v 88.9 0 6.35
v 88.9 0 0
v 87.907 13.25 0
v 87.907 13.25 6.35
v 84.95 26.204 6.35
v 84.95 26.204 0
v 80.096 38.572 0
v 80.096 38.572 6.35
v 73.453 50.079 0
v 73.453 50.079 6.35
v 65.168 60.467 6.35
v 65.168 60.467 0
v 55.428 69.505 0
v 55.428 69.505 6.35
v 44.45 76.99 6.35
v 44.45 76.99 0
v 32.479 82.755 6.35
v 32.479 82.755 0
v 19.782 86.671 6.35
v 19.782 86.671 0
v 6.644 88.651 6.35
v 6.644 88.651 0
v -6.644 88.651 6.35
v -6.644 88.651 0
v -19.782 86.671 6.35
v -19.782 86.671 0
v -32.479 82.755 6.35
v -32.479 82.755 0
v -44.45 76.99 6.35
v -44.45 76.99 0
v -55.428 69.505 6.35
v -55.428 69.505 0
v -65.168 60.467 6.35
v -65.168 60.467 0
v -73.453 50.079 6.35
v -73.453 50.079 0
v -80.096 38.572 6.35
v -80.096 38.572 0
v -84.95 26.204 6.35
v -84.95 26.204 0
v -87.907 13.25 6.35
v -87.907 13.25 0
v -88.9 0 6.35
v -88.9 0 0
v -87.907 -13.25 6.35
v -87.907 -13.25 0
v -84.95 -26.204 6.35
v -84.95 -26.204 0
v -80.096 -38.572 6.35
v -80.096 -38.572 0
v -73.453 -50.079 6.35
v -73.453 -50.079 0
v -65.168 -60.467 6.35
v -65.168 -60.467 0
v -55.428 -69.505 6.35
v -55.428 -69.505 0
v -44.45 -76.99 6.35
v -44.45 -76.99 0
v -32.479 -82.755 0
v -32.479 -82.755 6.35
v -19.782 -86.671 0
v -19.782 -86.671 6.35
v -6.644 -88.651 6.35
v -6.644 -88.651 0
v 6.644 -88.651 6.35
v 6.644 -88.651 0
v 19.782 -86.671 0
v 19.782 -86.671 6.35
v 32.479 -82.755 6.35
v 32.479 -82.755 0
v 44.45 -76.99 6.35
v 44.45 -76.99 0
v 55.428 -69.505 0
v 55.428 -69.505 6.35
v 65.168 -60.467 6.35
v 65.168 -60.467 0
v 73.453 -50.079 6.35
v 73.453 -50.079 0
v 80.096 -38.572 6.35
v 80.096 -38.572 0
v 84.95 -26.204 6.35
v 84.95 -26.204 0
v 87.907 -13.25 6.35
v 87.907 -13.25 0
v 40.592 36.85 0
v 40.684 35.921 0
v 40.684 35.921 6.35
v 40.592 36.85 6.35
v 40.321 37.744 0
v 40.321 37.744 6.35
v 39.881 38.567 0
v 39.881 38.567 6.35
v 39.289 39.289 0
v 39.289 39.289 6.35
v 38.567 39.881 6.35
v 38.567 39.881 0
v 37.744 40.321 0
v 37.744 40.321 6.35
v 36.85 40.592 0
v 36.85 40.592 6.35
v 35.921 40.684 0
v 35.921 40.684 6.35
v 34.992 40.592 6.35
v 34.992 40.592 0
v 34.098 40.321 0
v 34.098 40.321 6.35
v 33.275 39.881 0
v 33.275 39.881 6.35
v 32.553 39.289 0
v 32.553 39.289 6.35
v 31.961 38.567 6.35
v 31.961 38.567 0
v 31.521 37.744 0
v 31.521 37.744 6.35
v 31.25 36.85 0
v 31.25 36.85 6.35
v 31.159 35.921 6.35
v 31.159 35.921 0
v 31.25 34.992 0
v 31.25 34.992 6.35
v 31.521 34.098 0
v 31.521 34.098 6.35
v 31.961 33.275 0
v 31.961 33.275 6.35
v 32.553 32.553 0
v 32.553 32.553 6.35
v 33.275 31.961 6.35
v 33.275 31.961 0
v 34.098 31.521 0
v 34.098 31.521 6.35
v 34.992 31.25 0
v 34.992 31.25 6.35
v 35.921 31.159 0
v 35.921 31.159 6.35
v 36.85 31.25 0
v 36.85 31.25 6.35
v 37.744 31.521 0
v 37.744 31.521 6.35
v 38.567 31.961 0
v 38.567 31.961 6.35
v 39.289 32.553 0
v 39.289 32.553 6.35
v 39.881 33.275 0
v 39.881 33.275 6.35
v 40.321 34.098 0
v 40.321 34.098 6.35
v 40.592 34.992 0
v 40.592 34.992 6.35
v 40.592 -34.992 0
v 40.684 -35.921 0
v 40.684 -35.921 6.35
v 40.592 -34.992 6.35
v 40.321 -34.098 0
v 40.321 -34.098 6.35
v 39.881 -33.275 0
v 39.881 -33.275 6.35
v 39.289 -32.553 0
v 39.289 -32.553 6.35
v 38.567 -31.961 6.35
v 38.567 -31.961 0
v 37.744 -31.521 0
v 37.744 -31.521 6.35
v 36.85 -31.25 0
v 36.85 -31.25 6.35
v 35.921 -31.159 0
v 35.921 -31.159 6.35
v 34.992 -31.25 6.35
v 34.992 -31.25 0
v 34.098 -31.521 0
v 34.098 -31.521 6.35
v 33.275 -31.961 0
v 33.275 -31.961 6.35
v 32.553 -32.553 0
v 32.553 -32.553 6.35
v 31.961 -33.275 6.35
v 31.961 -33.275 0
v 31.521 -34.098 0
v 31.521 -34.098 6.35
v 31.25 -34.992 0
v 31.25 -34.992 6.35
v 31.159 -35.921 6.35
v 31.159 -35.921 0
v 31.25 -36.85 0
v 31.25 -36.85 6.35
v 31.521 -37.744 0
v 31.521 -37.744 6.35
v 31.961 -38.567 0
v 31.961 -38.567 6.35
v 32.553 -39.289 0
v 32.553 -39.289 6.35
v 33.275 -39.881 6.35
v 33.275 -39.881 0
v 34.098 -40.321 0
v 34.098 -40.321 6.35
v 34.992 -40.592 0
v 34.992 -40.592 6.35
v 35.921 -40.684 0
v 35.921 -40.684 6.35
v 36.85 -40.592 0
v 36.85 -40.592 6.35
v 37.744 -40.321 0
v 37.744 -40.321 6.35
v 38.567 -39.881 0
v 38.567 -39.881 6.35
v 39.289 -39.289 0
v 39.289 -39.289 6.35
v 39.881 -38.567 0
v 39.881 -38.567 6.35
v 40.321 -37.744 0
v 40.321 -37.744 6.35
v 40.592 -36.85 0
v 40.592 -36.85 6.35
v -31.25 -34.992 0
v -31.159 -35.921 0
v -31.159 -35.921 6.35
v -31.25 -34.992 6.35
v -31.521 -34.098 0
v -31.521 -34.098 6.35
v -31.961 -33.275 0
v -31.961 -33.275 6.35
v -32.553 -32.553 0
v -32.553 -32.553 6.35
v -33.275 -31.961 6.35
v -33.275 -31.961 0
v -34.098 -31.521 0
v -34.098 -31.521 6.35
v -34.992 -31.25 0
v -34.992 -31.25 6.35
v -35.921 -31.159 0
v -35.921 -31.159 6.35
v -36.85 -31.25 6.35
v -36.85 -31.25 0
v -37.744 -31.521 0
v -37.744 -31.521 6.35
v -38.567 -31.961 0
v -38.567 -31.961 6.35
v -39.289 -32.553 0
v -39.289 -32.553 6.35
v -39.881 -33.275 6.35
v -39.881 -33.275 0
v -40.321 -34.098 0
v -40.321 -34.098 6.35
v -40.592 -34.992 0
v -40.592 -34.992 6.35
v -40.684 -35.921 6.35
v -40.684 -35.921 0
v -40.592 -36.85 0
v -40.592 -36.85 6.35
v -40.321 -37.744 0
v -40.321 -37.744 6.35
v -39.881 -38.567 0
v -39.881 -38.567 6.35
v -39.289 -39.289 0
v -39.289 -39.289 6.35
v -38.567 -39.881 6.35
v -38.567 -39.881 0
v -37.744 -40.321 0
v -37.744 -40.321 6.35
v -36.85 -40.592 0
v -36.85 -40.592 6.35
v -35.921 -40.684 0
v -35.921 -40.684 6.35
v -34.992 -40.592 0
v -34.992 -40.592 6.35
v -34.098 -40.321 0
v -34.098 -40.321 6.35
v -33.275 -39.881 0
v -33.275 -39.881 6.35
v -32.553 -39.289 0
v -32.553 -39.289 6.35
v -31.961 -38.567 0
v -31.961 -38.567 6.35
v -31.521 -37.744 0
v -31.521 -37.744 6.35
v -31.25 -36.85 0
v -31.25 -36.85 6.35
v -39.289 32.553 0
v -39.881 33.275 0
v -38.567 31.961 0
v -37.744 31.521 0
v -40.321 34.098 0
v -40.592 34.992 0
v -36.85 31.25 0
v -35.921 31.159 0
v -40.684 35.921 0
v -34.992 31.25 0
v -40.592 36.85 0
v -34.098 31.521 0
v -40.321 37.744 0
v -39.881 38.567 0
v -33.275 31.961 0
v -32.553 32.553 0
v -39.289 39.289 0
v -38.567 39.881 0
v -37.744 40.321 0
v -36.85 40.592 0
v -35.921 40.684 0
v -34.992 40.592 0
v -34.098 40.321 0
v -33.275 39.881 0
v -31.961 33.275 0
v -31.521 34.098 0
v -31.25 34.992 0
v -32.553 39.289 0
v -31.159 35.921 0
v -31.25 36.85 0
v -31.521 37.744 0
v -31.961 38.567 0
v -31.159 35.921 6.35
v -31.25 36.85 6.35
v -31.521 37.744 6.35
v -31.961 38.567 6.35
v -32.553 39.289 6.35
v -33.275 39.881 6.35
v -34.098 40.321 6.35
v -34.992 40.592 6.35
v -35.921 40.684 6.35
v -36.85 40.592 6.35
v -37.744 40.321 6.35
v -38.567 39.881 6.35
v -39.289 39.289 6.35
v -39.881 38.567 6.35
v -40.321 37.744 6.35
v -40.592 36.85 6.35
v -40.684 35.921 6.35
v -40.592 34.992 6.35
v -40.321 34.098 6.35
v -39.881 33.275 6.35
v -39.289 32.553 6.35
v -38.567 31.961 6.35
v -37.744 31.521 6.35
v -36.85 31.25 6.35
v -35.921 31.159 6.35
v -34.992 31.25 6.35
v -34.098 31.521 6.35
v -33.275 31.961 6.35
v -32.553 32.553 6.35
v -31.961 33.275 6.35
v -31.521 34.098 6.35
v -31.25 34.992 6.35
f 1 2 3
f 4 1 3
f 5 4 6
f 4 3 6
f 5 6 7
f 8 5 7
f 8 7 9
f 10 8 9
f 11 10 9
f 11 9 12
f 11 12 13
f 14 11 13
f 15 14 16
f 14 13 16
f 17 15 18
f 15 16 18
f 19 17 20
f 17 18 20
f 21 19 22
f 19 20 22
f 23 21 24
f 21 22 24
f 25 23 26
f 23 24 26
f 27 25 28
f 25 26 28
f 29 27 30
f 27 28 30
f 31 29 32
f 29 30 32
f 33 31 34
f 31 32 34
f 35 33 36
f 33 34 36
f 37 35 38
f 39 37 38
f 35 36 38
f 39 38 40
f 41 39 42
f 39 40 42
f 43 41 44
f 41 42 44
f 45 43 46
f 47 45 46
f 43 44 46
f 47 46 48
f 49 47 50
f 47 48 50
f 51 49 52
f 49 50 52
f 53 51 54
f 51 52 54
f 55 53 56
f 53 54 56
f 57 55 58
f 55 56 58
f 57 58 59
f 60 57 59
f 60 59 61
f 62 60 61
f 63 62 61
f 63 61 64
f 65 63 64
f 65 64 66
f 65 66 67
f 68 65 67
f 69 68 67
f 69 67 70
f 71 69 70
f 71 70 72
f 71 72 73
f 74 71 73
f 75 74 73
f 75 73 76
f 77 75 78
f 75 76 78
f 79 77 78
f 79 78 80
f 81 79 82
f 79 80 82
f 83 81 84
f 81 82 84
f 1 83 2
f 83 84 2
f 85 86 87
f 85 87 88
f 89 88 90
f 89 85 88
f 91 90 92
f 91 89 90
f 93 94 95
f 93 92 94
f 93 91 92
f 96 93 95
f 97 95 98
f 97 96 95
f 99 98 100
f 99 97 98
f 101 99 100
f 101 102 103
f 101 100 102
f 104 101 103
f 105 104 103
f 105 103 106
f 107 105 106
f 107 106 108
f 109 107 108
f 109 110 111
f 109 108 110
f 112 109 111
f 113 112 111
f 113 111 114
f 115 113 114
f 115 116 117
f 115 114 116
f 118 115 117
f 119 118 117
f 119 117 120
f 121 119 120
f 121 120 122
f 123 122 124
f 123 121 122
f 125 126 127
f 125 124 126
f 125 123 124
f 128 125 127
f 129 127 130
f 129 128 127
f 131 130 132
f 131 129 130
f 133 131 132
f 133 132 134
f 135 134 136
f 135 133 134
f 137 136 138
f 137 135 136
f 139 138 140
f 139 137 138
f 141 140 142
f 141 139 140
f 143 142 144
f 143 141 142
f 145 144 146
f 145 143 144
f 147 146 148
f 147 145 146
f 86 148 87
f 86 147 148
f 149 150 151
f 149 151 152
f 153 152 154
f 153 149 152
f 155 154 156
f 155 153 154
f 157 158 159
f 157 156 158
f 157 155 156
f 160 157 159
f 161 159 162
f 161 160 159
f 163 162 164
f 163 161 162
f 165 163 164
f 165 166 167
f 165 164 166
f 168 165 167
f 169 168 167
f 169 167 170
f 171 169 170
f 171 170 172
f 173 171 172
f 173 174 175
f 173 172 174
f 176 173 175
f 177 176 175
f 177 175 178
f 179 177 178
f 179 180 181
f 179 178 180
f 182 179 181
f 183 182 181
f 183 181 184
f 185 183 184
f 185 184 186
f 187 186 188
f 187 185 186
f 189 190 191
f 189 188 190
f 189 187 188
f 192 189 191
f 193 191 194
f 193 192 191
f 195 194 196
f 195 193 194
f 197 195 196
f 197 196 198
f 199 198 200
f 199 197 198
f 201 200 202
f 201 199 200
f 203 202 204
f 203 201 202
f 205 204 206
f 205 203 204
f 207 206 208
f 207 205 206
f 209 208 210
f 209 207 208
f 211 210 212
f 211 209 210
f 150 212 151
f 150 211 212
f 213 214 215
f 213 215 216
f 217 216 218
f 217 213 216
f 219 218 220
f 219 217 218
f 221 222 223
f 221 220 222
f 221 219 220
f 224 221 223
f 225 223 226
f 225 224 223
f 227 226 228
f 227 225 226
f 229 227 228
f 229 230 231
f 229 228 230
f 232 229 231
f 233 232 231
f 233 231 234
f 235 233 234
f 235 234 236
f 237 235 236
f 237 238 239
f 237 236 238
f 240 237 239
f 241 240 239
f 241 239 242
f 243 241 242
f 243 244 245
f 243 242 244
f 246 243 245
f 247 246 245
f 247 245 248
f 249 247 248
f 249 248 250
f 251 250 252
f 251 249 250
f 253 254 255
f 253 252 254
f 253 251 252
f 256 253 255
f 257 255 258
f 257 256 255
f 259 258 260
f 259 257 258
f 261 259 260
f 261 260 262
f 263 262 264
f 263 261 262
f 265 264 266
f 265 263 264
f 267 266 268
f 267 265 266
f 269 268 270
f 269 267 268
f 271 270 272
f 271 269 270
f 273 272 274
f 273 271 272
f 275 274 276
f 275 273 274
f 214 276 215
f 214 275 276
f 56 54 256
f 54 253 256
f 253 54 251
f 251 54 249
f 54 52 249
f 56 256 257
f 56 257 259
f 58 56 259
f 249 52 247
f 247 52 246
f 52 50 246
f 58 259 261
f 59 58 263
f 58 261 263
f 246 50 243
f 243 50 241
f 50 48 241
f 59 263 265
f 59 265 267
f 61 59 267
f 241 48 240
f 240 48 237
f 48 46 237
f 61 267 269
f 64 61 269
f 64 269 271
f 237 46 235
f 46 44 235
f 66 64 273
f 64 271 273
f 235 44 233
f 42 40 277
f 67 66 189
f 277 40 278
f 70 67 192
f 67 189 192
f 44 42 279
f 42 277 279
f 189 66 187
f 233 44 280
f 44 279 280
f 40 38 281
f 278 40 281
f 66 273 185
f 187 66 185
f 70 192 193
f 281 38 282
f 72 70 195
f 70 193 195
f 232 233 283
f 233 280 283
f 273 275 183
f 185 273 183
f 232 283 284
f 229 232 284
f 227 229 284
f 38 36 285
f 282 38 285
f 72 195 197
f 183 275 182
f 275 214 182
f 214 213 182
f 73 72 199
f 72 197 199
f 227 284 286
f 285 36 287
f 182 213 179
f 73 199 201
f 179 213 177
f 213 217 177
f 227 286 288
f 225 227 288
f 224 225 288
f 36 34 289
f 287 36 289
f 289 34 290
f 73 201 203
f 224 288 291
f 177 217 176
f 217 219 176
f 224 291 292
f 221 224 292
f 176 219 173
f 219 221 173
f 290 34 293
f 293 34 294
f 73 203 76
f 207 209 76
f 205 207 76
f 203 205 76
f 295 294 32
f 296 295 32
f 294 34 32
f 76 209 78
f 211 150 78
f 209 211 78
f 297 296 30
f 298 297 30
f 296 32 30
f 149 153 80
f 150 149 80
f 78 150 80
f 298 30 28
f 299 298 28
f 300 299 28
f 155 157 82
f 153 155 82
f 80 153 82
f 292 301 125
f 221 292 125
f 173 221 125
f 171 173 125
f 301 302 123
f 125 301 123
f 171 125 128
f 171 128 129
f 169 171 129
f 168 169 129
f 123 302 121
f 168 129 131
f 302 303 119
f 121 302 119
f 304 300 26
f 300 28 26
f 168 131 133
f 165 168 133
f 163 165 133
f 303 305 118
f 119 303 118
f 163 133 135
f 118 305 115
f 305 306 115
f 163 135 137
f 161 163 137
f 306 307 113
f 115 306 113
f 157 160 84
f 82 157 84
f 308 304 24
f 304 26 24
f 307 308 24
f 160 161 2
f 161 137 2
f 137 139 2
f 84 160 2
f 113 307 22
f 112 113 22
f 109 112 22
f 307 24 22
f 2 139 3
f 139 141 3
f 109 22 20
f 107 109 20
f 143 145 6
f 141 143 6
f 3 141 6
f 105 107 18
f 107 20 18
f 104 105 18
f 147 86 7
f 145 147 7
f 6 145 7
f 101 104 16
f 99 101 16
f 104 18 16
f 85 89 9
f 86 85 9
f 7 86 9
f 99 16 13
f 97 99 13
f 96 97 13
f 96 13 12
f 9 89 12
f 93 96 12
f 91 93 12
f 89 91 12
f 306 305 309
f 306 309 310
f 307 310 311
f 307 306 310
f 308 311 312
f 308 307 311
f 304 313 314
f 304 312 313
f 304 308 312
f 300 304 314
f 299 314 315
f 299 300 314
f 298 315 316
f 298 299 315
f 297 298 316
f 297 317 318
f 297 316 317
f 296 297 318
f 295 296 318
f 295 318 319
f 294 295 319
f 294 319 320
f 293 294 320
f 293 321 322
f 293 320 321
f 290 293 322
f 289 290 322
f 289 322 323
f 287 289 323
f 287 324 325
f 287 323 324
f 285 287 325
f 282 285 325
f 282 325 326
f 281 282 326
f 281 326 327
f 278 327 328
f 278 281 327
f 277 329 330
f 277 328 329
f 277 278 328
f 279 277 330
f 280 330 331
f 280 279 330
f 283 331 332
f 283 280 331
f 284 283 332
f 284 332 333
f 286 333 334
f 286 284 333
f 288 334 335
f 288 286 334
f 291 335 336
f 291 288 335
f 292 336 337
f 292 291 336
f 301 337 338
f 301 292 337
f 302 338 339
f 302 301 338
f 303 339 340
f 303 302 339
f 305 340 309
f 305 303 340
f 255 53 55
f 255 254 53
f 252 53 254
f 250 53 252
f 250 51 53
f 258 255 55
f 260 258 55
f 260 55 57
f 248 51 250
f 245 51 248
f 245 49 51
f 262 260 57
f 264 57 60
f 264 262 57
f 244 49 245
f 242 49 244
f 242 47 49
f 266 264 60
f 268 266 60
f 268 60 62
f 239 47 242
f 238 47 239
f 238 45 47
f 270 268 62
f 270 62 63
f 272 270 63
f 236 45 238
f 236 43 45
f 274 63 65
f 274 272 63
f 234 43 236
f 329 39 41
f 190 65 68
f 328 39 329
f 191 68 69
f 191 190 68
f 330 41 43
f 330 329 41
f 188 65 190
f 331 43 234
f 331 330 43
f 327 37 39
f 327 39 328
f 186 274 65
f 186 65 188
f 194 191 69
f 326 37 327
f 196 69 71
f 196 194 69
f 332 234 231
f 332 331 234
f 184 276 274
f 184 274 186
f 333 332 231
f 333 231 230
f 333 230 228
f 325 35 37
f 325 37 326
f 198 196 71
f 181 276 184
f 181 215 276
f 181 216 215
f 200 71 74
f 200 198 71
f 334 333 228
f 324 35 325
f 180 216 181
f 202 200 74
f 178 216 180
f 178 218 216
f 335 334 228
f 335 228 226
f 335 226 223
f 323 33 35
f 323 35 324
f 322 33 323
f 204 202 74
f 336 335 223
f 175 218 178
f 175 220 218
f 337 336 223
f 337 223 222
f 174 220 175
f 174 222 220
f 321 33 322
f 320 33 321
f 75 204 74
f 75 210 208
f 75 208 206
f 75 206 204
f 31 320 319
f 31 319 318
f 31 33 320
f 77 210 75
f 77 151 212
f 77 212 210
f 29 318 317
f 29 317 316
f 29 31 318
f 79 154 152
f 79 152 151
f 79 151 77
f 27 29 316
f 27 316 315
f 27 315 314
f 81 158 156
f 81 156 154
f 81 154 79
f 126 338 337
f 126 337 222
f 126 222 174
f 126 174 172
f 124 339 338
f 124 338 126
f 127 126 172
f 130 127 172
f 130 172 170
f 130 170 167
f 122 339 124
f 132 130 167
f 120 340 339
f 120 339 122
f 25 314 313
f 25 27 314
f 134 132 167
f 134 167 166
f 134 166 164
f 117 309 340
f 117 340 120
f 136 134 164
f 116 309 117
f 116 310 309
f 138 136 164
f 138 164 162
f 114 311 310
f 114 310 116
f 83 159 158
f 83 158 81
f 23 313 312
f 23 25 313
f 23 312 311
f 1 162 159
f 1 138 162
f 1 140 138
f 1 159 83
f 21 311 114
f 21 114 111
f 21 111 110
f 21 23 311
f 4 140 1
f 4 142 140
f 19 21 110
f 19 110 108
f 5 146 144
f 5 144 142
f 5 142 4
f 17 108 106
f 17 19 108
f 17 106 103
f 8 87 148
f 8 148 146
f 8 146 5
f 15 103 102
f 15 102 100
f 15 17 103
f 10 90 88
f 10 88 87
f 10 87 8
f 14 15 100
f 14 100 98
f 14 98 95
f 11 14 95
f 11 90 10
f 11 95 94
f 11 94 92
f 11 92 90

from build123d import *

# Parameters (mm, degrees)
SKETCH1_R               = 88.9
BOSS_EXTRUDE1_DEPTH     = 6.35
CUT_EXTRUDE1_DEPTH      = 126.88384527
CUT_EXTRUDE1_DEPTH_BACK = 126.88384527
SKETCH2_R               = 4.7625


with BuildPart() as part:
    # Sketch1 → Boss-Extrude1 (new body)
    with BuildSketch(Plane.XY):
        Circle(SKETCH1_R)
    extrude(amount=BOSS_EXTRUDE1_DEPTH)

    # Sketch2 → Cut-Extrude1 (cut, two sides: drawn at the far end of the back side and taken through both)
    with BuildSketch(Plane.XY.offset(6.35).offset(-CUT_EXTRUDE1_DEPTH_BACK)):
        with Locations((-35.921024484, 35.921024484)):
            Circle(SKETCH2_R)
        with Locations((35.921024484, 35.921024484)):
            Circle(SKETCH2_R)
        with Locations((35.921024484, -35.921024484)):
            Circle(SKETCH2_R)
        with Locations((-35.921024484, -35.921024484)):
            Circle(SKETCH2_R)
    extrude(amount=CUT_EXTRUDE1_DEPTH + CUT_EXTRUDE1_DEPTH_BACK, mode=Mode.SUBTRACT)


solid = part.part
